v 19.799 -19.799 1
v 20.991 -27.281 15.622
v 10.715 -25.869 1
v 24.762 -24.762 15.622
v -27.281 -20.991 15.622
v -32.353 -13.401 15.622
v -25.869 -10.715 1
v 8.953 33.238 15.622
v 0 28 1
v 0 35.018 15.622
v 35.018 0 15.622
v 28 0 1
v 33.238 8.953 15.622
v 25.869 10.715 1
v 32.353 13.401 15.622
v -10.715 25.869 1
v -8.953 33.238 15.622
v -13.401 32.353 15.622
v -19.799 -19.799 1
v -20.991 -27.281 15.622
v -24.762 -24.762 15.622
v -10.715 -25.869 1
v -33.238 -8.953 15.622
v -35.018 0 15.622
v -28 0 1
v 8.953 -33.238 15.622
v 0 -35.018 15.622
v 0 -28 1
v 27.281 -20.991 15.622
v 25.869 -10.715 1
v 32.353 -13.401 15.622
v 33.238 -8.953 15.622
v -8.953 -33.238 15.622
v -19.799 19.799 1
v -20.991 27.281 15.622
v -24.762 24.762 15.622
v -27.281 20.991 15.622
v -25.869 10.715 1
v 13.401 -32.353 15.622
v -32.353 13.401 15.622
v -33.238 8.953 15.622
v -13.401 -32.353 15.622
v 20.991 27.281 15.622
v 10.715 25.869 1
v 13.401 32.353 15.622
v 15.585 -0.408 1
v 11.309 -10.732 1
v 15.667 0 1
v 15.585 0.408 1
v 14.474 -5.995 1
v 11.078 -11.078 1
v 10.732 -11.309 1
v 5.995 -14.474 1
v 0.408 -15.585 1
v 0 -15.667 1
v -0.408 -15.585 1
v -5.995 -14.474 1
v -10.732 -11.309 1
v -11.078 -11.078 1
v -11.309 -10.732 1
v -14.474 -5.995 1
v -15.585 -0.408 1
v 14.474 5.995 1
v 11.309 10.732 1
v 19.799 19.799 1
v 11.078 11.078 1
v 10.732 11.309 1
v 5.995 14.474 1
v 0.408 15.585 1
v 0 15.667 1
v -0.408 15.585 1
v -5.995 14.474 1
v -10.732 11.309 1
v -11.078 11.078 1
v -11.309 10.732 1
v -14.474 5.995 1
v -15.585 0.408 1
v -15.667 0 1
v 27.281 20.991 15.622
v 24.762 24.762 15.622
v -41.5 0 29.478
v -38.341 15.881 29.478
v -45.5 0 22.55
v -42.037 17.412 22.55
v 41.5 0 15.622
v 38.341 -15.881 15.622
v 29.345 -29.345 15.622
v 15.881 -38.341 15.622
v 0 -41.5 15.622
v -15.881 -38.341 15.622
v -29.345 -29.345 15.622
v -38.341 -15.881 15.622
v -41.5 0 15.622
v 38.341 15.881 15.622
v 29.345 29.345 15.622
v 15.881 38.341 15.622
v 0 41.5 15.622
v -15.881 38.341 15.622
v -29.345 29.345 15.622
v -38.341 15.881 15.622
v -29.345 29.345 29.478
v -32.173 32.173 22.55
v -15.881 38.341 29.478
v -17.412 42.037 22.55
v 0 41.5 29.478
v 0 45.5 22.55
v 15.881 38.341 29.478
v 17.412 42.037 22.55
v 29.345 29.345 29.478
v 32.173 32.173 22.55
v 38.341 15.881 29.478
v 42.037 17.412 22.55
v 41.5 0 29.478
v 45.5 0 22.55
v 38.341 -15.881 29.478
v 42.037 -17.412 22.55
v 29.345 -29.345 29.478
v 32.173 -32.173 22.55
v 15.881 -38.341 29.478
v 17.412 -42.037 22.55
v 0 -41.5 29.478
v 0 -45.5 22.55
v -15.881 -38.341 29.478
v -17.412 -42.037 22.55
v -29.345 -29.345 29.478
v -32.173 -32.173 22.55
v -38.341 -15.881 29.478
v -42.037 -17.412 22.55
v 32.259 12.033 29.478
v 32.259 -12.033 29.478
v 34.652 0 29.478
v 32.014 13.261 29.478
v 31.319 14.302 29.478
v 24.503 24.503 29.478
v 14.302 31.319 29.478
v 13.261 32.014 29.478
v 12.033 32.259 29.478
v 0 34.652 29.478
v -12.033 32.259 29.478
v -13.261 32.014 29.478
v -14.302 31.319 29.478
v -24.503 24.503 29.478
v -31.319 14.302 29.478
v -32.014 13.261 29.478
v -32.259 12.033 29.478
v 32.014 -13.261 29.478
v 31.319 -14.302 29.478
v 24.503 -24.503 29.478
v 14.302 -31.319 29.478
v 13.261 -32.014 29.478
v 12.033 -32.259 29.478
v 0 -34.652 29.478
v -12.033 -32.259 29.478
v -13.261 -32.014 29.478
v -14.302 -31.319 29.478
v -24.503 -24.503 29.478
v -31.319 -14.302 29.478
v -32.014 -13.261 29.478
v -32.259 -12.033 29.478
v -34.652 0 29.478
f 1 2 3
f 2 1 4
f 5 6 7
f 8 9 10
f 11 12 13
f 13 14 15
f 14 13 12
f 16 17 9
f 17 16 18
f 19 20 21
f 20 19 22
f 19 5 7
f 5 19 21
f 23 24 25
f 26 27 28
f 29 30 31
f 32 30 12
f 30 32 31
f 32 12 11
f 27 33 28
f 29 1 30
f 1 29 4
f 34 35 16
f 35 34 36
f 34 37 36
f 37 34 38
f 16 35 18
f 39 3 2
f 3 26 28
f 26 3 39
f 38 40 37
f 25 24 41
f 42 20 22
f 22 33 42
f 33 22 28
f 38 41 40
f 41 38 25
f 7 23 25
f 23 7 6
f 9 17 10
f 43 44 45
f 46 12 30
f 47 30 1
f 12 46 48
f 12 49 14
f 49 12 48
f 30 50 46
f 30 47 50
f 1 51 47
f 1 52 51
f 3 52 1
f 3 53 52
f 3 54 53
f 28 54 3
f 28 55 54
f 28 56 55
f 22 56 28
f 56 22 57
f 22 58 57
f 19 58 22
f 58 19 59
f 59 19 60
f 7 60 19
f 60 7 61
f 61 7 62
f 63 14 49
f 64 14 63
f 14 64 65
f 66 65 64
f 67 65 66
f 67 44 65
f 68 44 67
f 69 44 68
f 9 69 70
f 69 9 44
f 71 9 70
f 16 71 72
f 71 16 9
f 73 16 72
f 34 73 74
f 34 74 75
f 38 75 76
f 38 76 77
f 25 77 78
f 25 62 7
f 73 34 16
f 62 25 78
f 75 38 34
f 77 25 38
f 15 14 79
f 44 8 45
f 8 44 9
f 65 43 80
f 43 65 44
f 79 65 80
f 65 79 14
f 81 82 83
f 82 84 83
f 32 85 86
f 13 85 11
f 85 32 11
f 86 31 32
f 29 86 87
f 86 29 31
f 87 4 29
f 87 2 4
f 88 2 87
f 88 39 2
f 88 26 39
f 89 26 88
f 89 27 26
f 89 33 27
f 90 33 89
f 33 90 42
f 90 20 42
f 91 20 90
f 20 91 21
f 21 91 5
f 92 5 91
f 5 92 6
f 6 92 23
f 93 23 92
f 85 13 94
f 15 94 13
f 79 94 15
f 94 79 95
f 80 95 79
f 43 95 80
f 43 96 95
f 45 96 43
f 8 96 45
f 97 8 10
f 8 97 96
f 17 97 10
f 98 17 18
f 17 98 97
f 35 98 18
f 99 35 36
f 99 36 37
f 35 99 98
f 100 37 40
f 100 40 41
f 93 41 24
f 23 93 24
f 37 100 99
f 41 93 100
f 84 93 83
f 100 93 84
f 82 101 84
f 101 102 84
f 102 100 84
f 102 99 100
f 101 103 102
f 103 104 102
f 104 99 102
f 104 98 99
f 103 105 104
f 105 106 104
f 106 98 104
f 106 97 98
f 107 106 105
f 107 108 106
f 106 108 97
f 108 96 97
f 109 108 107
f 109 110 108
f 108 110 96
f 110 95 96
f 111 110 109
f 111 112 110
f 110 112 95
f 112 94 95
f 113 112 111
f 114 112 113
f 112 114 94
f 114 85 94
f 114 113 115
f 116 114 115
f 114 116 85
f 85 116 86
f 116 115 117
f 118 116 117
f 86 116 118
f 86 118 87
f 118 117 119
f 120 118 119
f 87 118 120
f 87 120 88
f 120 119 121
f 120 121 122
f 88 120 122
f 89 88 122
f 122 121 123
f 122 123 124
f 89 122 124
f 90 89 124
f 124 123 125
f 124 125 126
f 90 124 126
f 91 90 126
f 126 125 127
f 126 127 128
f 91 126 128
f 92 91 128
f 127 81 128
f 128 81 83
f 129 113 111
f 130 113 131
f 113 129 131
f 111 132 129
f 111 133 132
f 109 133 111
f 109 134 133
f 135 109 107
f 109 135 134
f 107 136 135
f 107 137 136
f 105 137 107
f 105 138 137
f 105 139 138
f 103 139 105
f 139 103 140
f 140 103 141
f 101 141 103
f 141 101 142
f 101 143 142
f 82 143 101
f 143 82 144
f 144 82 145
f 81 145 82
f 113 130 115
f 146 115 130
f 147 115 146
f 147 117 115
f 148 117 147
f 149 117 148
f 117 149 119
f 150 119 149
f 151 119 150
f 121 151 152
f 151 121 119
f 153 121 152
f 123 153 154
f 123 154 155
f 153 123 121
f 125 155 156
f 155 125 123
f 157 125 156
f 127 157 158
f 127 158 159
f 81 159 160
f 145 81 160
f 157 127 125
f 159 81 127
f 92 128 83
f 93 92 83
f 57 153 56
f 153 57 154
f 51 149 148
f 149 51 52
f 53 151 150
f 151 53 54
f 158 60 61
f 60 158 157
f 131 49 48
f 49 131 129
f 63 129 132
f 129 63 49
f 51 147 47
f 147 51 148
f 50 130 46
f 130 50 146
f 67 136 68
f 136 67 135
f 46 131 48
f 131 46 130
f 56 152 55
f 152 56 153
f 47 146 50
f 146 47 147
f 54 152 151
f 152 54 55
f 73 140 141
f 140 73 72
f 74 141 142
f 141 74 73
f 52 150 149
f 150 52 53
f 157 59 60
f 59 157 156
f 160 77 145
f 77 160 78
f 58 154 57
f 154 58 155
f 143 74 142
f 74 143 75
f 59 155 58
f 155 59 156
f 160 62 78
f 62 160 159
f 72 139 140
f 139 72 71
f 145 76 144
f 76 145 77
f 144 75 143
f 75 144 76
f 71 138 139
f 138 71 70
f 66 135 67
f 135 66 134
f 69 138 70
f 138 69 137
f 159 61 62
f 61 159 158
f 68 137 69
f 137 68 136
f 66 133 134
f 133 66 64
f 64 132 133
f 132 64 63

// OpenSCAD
difference() {
  translate([0, 0, -8]) {
    union() {
      translate([0, 0, 9]) cylinder(25, 28, 40, $fn = 16);
      translate([0, 0, 30.55]) 
        rotate_extrude(angle = 360, $fn = 16)
          translate([37.5, 0, 0]) 
            circle(8, $fn = 6);
    }
  }
  
  cylinder(37.5, 15, 40, $fn = 16);
  translate([0, 0, -25]) cylinder(50, 8, 8, $fn = 16);
}
